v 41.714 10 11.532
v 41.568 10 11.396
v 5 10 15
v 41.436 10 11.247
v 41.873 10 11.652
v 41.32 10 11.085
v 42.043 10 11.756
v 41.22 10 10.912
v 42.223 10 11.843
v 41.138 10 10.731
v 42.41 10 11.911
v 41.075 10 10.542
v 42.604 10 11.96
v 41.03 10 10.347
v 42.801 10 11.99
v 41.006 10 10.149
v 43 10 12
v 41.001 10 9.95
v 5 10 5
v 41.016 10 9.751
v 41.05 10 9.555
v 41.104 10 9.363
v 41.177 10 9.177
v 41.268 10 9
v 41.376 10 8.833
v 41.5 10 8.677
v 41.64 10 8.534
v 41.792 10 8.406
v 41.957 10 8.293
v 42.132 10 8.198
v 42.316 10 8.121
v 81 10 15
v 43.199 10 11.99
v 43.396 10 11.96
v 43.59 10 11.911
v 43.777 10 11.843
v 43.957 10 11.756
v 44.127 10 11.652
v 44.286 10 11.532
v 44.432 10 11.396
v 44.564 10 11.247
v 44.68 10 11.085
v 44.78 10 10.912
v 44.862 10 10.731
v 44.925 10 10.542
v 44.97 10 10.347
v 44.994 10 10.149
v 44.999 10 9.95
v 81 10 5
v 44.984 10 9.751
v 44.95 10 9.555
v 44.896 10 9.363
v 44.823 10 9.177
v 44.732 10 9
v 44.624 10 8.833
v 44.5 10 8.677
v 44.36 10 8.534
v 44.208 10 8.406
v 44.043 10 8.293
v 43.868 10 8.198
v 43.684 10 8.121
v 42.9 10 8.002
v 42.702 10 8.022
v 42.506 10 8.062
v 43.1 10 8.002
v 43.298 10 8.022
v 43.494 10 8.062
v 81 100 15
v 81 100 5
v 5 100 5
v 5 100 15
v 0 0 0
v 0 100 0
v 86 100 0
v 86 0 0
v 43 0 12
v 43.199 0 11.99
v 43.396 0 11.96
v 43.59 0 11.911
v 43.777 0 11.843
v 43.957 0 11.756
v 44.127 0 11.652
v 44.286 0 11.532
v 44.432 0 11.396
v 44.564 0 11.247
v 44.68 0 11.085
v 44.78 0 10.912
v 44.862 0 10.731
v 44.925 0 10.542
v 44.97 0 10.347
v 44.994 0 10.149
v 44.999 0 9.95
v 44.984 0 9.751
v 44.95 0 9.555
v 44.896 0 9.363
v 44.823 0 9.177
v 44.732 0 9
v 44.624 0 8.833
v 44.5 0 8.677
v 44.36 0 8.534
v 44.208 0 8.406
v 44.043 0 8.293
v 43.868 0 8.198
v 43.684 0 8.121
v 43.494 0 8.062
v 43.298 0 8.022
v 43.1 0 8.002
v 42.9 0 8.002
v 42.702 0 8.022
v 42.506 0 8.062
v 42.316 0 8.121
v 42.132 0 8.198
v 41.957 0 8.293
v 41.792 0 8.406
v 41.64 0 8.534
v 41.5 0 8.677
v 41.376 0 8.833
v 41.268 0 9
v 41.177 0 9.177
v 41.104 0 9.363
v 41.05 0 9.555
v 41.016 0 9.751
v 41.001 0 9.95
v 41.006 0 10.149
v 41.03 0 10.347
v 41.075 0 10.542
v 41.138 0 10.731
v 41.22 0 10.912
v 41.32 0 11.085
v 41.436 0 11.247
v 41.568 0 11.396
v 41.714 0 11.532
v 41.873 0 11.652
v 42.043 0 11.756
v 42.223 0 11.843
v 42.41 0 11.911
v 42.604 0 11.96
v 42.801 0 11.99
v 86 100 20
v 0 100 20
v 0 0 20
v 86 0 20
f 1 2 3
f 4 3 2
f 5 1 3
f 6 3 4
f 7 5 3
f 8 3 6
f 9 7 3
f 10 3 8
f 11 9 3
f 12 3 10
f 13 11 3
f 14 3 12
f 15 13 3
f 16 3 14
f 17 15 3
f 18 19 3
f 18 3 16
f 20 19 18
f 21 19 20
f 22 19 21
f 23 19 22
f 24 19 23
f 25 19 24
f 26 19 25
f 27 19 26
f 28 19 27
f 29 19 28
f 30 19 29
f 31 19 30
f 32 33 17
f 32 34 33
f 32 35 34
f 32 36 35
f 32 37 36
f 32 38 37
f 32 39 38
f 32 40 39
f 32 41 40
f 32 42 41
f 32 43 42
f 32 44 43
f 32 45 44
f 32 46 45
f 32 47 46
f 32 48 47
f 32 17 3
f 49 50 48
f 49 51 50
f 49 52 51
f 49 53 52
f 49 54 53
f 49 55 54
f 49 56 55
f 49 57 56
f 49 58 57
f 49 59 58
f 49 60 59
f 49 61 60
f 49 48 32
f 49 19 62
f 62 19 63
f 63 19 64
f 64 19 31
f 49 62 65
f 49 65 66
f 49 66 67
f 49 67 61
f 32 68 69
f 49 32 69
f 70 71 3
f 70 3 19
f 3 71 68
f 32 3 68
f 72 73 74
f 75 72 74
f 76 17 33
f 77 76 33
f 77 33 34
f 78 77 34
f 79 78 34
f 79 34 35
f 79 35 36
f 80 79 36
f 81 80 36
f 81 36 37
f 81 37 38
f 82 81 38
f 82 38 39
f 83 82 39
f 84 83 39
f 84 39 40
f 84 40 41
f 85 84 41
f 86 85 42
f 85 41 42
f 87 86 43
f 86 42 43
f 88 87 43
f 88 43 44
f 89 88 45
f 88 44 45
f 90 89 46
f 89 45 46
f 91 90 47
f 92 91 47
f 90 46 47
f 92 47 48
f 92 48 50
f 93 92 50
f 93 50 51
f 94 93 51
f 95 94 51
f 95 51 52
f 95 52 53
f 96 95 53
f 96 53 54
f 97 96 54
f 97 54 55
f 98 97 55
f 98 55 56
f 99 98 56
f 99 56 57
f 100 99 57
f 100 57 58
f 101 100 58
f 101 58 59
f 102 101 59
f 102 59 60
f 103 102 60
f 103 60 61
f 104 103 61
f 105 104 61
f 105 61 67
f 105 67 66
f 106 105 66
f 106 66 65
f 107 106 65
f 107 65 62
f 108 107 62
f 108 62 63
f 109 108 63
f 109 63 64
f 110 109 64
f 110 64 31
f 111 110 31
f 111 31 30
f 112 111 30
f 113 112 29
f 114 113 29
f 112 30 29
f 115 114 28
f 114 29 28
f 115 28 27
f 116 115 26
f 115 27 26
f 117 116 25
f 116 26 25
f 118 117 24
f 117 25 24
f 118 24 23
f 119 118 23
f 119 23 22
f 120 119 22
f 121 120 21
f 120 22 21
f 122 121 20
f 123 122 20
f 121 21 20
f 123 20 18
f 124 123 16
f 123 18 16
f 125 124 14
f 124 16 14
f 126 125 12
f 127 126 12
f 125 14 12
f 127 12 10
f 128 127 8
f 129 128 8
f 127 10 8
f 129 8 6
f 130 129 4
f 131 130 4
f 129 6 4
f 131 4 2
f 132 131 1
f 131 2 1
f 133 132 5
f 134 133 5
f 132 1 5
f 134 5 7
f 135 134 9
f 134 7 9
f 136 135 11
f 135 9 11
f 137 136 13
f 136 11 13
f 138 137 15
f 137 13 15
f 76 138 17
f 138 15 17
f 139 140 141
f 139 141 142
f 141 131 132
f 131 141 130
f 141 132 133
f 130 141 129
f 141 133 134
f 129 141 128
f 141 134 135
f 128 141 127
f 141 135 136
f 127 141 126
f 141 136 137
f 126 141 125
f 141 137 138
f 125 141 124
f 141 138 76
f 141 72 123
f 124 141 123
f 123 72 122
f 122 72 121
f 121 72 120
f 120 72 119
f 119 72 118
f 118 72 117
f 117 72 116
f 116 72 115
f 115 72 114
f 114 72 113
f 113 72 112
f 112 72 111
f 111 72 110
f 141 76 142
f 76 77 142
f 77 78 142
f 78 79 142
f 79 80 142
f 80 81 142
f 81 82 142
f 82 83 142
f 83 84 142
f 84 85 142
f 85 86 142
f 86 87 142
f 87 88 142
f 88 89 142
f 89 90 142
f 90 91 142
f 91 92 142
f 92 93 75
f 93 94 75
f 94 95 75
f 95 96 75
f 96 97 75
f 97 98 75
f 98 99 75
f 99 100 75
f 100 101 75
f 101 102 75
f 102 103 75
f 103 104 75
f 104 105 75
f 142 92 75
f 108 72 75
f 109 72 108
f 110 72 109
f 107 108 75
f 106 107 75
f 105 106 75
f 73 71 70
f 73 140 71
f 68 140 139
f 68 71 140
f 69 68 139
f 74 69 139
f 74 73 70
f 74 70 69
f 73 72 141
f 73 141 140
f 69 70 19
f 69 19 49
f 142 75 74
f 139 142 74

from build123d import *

# Parameters (mm, degrees)
SKETCH3_W           = 86
SKETCH3_H           = 100
BOSS_EXTRUDE1_DEPTH = 20
SKETCH5_W           = 76
SKETCH5_H           = 10
CUT_EXTRUDE1_DEPTH  = 90
SKETCH6_R           = 2
CUT_EXTRUDE2_DEPTH  = 90


with BuildPart() as part:
    # Sketch3 → Boss-Extrude1 (new body)
    with BuildSketch(Plane.XY):
        with Locations((43, 50)):
            Rectangle(SKETCH3_W, SKETCH3_H)
    extrude(amount=BOSS_EXTRUDE1_DEPTH)

    # Sketch5 → Cut-Extrude1 (cut)
    with BuildSketch(Plane(origin=(0, 100, 0), x_dir=(1, 0, 0), z_dir=(0, 1, 0))):
        with Locations((43, -10)):
            Rectangle(SKETCH5_W, SKETCH5_H)
    extrude(amount=-CUT_EXTRUDE1_DEPTH, mode=Mode.SUBTRACT)

    # Sketch6 → Cut-Extrude2 (cut)
    with BuildSketch(Plane(origin=(0, 10, 0), x_dir=(1, 0, 0), z_dir=(0, 1, 0))):
        with Locations(Location((43, -10, 0), (0, 0, 270))):
            Circle(SKETCH6_R)
    extrude(amount=-CUT_EXTRUDE2_DEPTH, mode=Mode.SUBTRACT)


solid = part.part
